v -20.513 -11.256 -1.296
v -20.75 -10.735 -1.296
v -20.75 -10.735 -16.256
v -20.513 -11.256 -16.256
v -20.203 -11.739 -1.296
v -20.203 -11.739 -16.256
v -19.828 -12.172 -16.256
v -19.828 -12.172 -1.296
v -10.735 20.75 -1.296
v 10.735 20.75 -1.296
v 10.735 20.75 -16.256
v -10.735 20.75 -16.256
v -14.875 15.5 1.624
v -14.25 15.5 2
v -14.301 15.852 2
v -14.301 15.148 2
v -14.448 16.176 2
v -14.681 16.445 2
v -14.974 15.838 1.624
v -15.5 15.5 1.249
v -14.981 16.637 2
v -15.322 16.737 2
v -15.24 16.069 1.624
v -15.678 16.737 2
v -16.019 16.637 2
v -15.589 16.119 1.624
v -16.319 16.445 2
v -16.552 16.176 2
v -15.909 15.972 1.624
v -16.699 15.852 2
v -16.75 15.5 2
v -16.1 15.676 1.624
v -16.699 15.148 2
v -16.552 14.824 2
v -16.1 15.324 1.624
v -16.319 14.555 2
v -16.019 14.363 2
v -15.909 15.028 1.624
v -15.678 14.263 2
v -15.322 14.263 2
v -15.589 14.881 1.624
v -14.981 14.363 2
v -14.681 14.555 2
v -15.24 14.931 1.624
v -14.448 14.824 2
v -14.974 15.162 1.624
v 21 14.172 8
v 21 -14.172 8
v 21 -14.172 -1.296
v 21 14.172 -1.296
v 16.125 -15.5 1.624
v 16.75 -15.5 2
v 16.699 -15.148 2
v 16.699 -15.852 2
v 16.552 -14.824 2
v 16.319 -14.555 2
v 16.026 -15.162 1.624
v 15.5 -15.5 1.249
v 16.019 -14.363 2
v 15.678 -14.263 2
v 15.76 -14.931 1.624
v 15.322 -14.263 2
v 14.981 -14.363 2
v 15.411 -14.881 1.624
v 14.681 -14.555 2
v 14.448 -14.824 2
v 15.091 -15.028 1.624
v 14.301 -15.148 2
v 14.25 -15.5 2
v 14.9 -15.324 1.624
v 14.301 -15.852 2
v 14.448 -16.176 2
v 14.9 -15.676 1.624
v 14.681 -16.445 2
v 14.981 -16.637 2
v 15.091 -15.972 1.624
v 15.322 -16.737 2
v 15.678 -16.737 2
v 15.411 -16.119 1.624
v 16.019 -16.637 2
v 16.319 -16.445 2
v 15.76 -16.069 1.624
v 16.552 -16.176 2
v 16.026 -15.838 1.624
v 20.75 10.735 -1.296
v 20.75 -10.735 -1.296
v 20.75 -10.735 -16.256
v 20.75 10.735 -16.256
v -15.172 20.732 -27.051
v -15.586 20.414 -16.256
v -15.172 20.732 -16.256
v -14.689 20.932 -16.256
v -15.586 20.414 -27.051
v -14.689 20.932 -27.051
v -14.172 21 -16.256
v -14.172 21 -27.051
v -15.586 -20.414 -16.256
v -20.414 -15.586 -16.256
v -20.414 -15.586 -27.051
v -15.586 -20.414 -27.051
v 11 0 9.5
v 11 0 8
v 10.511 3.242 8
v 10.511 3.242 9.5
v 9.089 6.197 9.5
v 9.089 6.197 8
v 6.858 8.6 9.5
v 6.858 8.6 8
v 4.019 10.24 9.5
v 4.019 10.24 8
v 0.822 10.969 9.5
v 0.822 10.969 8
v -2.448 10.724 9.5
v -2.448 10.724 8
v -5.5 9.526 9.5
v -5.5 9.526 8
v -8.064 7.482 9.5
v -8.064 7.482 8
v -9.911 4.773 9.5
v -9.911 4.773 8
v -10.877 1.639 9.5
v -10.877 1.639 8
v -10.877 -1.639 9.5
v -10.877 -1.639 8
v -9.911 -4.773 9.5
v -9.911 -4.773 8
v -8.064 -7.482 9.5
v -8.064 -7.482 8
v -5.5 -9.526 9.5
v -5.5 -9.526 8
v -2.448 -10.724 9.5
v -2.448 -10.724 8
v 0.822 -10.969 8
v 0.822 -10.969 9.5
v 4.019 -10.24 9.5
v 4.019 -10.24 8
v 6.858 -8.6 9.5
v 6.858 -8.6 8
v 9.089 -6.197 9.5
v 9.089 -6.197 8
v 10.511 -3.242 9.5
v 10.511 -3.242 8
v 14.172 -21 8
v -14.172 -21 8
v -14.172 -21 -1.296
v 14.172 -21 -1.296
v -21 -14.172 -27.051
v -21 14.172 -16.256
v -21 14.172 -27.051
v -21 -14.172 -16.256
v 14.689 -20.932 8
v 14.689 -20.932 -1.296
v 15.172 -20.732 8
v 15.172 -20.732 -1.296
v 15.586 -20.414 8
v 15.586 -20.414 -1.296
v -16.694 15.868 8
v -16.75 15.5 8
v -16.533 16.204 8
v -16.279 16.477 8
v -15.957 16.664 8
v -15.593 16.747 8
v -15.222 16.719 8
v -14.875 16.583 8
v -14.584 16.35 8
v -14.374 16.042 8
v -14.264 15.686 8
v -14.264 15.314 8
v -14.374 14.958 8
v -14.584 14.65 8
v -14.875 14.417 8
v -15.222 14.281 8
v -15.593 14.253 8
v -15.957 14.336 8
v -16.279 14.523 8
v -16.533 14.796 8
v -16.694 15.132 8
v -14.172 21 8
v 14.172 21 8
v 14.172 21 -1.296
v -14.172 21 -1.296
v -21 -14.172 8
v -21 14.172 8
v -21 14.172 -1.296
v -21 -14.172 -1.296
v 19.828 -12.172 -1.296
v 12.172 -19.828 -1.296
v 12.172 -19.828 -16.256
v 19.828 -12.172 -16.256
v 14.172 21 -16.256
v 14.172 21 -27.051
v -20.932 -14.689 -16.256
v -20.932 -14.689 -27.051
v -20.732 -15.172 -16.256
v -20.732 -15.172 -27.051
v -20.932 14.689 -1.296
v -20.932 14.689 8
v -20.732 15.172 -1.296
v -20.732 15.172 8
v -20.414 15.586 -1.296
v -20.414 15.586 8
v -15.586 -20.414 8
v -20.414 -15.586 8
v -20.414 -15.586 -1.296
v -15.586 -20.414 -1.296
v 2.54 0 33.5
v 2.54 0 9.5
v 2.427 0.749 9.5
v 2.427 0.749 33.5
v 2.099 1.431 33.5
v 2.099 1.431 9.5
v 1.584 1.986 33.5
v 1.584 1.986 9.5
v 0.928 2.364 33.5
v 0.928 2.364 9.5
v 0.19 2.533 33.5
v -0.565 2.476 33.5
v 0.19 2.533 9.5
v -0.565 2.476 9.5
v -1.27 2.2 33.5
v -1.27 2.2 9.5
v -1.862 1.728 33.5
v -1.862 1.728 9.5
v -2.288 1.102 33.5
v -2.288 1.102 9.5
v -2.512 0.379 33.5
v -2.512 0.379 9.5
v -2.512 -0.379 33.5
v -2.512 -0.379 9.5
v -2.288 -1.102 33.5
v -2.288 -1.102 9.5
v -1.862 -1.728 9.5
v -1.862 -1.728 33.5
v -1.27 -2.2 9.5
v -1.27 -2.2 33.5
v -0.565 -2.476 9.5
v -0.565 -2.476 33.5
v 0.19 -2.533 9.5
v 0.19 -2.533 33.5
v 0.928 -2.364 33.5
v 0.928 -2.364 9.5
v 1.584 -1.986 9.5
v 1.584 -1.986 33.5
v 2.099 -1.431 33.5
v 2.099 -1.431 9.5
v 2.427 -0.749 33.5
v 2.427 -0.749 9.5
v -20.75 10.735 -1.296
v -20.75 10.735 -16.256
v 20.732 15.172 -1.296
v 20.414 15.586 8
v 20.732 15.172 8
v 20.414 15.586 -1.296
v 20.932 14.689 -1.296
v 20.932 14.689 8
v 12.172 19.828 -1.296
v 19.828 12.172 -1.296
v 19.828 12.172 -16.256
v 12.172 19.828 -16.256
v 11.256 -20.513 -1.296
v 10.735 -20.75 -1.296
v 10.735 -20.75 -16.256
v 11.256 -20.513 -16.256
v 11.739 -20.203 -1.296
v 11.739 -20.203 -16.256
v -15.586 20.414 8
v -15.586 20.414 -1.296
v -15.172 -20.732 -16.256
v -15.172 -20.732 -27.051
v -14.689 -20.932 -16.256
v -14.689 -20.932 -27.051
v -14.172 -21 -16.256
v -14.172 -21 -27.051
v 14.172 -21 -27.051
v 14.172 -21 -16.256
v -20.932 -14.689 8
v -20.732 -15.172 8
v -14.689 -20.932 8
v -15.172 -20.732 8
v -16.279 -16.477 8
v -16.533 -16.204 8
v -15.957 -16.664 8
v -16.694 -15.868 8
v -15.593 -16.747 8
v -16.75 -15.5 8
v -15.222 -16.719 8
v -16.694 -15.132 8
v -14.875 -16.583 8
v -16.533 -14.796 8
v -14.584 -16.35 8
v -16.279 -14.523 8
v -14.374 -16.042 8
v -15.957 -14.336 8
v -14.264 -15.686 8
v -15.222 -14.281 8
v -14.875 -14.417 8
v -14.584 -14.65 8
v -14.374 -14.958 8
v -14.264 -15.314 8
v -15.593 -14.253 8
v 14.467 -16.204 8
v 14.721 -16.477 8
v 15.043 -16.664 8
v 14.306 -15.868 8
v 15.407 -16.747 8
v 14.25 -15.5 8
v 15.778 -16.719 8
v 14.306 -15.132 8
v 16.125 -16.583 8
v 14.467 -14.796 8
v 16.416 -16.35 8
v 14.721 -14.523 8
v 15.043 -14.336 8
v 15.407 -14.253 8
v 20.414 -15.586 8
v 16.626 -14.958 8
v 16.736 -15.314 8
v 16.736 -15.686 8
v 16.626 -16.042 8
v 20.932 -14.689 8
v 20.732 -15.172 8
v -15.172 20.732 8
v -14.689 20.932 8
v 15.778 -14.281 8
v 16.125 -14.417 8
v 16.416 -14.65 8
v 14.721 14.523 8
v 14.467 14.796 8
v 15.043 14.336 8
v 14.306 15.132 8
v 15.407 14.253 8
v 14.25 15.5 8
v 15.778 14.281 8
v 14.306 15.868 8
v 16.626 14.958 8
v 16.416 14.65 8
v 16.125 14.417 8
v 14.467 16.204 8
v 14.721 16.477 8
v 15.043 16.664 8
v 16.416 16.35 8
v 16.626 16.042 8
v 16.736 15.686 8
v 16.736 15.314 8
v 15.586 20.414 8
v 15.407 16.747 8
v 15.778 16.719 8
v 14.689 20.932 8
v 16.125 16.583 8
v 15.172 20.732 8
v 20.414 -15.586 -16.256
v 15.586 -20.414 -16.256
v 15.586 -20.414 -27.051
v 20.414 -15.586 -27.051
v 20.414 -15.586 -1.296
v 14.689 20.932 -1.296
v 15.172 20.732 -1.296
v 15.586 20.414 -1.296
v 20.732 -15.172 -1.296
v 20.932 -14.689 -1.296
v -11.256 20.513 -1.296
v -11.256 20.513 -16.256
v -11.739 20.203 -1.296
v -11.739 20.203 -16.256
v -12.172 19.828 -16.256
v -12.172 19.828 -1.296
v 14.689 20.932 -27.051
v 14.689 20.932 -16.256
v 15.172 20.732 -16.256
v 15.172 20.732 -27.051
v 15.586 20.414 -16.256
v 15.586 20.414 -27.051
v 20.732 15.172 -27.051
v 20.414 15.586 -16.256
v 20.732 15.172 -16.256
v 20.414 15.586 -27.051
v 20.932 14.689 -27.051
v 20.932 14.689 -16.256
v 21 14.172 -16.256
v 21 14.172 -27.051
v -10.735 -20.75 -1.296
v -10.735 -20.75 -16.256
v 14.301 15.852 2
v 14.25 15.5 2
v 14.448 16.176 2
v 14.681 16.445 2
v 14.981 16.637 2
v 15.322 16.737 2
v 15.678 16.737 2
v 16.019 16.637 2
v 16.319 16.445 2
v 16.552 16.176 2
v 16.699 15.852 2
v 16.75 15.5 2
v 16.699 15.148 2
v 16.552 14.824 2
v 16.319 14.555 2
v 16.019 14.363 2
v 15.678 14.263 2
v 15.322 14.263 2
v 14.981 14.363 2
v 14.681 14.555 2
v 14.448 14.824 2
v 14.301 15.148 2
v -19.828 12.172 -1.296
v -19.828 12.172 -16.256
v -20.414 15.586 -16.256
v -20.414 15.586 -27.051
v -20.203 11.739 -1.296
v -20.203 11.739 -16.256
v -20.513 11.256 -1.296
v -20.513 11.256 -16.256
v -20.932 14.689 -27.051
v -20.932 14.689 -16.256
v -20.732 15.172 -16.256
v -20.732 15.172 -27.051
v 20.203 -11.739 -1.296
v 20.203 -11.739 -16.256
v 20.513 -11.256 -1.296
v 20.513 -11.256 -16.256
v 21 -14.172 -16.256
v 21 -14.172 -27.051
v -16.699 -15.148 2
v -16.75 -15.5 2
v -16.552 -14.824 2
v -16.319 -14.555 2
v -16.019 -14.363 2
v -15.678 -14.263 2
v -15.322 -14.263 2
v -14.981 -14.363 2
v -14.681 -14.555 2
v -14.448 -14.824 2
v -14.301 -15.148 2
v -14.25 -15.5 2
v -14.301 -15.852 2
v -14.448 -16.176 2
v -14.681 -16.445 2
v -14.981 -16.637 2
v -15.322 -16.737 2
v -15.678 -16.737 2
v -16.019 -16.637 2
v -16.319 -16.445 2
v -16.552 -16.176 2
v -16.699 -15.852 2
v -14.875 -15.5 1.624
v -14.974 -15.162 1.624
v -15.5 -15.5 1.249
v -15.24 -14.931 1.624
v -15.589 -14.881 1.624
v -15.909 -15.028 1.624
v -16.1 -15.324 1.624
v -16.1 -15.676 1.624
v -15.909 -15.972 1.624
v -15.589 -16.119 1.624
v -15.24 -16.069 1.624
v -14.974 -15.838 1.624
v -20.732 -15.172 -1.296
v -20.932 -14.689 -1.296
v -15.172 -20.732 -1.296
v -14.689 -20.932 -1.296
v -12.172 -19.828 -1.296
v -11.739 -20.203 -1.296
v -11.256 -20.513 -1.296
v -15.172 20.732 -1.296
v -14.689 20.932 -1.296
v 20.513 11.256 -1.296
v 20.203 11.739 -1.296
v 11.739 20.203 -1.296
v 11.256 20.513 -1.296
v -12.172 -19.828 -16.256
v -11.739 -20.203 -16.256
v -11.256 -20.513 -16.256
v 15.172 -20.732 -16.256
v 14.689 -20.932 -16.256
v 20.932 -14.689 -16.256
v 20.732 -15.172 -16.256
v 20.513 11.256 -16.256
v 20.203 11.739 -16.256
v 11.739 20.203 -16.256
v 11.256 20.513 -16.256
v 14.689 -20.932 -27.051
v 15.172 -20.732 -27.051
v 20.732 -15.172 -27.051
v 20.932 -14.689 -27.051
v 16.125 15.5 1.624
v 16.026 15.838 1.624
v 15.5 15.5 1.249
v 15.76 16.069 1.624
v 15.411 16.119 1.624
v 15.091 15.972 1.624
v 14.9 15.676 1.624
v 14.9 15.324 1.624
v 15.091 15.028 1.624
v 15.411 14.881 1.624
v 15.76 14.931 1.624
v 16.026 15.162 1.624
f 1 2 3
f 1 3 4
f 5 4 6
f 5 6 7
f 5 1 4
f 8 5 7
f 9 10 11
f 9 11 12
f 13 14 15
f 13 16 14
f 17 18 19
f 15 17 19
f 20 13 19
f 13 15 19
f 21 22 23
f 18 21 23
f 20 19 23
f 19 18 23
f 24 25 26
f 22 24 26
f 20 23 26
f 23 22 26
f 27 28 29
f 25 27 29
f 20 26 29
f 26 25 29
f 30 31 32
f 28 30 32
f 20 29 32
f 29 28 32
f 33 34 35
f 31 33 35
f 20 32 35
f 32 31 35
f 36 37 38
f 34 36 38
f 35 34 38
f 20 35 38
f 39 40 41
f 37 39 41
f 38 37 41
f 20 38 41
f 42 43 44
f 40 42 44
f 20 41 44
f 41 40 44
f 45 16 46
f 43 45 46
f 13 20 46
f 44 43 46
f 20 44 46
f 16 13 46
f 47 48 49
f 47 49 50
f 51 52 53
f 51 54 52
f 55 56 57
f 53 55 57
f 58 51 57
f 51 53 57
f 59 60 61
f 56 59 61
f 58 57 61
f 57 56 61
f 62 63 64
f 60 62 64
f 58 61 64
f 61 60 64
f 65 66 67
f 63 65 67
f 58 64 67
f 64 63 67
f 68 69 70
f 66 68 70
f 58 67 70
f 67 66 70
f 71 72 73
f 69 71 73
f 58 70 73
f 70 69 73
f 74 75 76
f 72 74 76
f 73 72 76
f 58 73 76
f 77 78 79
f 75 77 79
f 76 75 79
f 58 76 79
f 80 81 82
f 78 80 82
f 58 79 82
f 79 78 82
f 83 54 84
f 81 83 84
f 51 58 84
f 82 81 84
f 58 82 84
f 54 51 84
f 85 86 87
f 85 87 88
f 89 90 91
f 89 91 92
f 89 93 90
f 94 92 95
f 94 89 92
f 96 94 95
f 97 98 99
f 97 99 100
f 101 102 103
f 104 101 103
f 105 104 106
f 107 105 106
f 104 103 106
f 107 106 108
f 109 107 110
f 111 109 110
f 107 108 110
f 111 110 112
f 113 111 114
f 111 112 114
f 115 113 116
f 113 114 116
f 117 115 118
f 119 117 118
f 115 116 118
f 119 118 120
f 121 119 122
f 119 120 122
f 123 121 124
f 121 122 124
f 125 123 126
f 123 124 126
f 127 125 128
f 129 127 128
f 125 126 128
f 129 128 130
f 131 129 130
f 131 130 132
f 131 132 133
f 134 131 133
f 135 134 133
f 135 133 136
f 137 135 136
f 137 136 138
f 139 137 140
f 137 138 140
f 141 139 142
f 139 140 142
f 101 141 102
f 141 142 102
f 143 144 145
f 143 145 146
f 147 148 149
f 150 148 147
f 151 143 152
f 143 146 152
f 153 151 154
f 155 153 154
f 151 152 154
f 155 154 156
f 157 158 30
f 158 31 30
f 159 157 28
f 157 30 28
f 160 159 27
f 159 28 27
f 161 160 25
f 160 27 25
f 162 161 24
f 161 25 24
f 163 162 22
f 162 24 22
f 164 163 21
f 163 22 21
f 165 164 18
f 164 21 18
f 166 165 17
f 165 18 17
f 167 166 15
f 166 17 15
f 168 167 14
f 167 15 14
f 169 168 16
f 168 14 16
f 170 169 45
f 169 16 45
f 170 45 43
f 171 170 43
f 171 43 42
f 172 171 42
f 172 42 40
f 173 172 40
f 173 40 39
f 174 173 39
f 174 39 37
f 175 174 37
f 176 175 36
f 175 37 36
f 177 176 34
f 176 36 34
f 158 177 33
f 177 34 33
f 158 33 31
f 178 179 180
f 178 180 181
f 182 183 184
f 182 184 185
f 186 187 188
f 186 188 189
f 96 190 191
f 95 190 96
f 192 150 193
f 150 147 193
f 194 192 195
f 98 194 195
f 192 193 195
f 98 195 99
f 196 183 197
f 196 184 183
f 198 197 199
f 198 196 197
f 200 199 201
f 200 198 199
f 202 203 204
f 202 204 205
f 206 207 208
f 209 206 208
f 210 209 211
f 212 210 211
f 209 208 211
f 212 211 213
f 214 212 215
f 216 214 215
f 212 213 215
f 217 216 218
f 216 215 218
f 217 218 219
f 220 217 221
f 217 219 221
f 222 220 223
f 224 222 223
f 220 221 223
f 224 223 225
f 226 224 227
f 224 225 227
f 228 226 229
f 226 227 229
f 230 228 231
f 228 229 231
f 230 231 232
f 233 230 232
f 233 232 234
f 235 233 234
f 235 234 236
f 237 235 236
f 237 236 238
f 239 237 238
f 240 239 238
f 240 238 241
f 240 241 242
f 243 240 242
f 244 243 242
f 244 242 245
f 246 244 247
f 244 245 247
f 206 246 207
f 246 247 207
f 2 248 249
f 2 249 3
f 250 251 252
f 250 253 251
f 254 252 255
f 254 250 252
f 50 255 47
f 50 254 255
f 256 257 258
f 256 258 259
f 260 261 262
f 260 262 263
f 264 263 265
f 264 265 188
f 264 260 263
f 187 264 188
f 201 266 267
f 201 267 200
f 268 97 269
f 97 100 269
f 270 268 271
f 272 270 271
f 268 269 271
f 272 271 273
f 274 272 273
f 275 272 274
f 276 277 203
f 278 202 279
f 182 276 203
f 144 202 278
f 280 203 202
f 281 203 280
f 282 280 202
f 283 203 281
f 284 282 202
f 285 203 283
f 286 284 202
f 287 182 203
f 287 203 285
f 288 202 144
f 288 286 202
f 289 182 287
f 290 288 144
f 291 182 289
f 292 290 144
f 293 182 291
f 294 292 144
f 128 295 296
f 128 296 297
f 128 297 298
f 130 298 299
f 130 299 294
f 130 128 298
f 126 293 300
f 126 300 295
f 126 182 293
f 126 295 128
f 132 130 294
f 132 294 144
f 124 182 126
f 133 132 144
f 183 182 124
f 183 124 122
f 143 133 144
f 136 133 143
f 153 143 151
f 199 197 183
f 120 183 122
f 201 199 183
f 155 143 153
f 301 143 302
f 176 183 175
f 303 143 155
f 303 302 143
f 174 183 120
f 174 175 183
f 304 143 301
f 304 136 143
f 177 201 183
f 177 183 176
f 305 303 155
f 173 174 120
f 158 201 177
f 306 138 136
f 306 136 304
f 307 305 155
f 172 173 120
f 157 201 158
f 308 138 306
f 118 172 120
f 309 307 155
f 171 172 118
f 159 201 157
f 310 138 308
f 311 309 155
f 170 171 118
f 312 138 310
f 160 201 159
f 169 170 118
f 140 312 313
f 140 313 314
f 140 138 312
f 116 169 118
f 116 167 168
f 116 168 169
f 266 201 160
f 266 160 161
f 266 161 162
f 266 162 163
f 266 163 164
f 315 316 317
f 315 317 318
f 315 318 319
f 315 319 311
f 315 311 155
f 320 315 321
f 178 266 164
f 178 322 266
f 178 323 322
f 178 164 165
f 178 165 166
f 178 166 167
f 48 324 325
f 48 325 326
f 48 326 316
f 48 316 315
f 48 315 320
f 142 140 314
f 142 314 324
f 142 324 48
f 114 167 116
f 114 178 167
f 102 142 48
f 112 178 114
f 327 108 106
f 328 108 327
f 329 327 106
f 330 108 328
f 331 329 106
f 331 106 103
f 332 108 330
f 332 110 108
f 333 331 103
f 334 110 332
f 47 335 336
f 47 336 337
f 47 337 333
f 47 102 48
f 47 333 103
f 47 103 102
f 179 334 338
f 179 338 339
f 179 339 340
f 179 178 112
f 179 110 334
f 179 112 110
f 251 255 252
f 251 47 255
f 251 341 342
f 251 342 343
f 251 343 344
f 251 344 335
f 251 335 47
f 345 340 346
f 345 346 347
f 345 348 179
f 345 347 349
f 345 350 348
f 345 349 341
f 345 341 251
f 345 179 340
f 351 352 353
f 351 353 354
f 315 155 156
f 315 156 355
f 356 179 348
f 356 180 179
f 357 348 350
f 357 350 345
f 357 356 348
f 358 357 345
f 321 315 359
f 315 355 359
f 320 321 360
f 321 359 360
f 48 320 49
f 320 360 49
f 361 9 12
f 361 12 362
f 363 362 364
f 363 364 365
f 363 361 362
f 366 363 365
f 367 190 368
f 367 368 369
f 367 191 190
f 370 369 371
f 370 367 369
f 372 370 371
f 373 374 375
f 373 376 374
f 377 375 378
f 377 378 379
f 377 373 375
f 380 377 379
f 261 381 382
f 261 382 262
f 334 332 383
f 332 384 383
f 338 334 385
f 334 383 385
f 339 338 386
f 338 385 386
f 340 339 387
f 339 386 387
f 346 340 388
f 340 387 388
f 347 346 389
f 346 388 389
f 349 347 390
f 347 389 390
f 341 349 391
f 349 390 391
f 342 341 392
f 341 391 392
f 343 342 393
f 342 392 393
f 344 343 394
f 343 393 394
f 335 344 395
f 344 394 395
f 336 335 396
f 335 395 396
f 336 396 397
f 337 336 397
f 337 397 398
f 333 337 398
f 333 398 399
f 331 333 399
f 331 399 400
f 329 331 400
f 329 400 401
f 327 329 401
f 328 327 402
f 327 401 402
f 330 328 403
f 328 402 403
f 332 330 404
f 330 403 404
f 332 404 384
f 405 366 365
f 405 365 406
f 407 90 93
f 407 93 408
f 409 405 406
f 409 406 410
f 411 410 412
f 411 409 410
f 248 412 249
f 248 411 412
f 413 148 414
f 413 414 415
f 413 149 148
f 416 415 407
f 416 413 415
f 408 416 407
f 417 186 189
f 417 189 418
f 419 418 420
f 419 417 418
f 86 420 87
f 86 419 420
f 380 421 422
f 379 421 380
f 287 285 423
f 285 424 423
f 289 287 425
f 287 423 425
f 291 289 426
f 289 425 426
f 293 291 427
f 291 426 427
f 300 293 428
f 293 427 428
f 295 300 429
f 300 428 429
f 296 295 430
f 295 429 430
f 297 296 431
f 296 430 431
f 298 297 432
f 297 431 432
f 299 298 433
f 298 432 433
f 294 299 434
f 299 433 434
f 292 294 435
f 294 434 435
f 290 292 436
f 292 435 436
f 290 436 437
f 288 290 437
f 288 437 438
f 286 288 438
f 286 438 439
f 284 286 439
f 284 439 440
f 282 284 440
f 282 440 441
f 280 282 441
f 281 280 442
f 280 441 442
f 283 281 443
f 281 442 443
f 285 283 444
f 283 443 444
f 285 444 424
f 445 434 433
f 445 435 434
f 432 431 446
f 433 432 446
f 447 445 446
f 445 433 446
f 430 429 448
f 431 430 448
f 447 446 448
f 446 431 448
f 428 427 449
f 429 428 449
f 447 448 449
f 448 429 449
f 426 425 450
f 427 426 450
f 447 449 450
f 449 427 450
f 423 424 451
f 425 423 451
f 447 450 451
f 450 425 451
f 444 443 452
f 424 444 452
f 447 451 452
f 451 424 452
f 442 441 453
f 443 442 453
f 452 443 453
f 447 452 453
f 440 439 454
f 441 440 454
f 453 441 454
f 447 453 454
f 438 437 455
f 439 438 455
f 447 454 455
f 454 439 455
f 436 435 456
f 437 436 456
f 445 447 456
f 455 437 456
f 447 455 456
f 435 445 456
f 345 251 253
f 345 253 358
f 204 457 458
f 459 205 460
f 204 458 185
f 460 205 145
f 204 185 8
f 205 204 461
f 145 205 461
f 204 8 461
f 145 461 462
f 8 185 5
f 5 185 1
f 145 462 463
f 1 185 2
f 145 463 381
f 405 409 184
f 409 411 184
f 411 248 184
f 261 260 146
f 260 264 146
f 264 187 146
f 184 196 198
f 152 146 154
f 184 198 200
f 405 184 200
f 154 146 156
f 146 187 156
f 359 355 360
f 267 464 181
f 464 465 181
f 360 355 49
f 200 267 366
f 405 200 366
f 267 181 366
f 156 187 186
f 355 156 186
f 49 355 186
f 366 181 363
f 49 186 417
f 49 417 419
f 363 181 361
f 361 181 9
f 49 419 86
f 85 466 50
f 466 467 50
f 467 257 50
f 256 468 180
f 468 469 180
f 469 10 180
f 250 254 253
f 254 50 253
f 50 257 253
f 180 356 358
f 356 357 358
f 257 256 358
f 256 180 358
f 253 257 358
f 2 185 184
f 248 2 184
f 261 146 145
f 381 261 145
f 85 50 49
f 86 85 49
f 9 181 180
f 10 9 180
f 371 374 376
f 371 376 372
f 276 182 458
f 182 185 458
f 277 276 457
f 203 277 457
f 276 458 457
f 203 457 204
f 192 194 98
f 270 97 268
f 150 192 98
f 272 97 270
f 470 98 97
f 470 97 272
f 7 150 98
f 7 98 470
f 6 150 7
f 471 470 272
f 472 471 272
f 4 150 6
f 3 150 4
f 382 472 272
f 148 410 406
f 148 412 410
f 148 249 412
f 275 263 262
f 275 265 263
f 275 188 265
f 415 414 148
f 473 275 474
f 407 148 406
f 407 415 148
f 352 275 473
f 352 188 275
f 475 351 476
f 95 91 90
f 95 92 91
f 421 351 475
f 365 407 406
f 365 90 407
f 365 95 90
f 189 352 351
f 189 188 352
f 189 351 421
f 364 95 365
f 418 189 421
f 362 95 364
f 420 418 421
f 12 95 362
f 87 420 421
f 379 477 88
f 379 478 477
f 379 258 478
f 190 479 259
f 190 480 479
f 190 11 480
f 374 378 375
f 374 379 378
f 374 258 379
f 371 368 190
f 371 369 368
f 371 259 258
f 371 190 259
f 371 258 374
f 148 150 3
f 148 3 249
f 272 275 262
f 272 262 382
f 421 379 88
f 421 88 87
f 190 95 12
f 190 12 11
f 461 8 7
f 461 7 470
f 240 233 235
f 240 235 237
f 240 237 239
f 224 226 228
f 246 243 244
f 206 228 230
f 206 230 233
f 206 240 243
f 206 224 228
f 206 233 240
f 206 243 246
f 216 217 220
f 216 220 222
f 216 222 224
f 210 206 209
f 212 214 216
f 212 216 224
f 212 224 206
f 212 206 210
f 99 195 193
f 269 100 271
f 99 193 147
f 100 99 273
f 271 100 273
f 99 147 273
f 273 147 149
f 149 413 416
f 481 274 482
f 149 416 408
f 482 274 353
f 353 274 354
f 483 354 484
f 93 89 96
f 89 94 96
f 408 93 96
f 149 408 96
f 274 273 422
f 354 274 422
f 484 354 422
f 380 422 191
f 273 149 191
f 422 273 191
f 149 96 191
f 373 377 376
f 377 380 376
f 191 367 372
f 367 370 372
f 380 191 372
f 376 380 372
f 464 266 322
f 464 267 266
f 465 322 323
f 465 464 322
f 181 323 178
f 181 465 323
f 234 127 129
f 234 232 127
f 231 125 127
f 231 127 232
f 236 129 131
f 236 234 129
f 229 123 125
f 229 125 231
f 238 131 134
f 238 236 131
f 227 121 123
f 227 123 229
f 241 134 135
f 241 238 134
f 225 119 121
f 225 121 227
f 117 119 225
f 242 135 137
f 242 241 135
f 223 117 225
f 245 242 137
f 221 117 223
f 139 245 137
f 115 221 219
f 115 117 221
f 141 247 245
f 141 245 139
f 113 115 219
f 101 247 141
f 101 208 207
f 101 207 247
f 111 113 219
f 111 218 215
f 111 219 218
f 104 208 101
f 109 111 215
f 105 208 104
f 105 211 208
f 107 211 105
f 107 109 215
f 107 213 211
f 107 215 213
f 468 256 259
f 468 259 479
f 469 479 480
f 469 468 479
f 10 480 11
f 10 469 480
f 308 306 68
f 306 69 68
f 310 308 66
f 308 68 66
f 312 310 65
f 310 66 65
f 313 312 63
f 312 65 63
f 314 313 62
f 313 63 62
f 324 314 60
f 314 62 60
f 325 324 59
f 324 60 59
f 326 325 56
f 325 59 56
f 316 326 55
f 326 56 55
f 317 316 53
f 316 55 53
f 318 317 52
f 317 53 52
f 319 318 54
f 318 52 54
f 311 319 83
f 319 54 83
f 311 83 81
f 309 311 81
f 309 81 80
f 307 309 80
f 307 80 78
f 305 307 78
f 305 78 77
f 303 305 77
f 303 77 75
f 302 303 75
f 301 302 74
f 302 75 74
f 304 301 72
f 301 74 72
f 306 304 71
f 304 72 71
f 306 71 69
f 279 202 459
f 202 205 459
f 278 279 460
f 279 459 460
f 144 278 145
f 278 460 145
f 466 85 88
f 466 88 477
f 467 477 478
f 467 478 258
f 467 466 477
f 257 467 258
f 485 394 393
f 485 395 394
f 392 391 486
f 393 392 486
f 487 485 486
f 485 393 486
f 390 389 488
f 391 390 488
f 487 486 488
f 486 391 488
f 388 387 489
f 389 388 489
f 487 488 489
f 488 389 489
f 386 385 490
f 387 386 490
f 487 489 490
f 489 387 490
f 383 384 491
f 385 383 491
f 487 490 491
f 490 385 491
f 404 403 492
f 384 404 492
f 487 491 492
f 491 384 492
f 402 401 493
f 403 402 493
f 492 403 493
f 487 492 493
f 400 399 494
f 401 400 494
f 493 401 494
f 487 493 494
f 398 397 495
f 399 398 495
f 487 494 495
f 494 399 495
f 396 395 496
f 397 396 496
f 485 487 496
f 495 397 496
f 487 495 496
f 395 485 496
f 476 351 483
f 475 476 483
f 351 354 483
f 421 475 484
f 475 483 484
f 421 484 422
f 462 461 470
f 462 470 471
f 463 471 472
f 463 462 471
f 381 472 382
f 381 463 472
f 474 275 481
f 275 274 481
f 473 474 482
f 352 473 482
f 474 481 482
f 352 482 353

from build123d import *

# Parameters (mm, degrees)
BOSS_EXTRUDE1_DEPTH       = 9.2964
BOSS_EXTRUDE2_DEPTH       = 16.002
BOSS_EXTRUDE3_DEPTH       = 10.795
SKETCH4_R                 = 11
BOSS_EXTRUDE4_DEPTH       = 1.5
SKETCH5_R                 = 2.54
BOSS_EXTRUDE5_DEPTH       = 24
F_2_CLEARANCE_HOLE1_D     = 2.5
F_2_CLEARANCE_HOLE1_DEPTH = 6
F_2_CLEARANCE_HOLE1_TIP   = 0.751075774
FILLET1_R                 = 2


with BuildPart() as part:
    # Sketch1 → Boss-Extrude1 (new body)
    with BuildSketch(Plane.XY.offset(8)):
        Polygon((-21, 15), (-21, -15), (-15, -21), (15, -21), (21, -15), (21, 15), (15, 21), (-15, 21), align=None)
    extrude(amount=-BOSS_EXTRUDE1_DEPTH)

    # Sketch2 → Boss-Extrude2 (add)
    with BuildSketch(Plane(origin=(0, 0, -1.2964), x_dir=(-1, 0, 0), z_dir=(0, 0, -1))):
        with BuildLine():
            Line((-10.735086841, 20.75), (10.735086841, 20.75))
            ThreePointArc((10.735086841, 20.75), (11.503053413, 20.366719307), (12.171572875, 19.828427125))
            Line((12.171572875, 19.828427125), (19.828427125, 12.171572875))
            ThreePointArc((19.828427125, 12.171572875), (20.366719307, 11.503053413), (20.75, 10.735086841))
            Line((20.75, 10.735086841), (20.75, -10.735086841))
            ThreePointArc((20.75, -10.735086841), (20.366719307, -11.503053413), (19.828427125, -12.171572875))
            Line((19.828427125, -12.171572875), (12.171572875, -19.828427125))
            ThreePointArc((12.171572875, -19.828427125), (11.503053413, -20.366719307), (10.735086841, -20.75))
            Line((10.735086841, -20.75), (-10.735086841, -20.75))
            ThreePointArc((-10.735086841, -20.75), (-11.503053413, -20.366719307), (-12.171572875, -19.828427125))
            Line((-12.171572875, -19.828427125), (-19.828427125, -12.171572875))
            ThreePointArc((-19.828427125, -12.171572875), (-20.366719307, -11.503053413), (-20.75, -10.735086841))
            Line((-20.75, -10.735086841), (-20.75, 10.735086841))
            ThreePointArc((-20.75, 10.735086841), (-20.366719307, 11.503053413), (-19.828427125, 12.171572875))
            Line((-19.828427125, 12.171572875), (-12.171572875, 19.828427125))
            ThreePointArc((-12.171572875, 19.828427125), (-11.503053413, 20.366719307), (-10.735086841, 20.75))
        make_face()
    extrude(amount=BOSS_EXTRUDE2_DEPTH)

    # Sketch3 → Boss-Extrude3 (add)
    with BuildSketch(Plane.XY.offset(-16.256)):
        Polygon((-21, 15), (-21, -15), (-15, -21), (15, -21), (21, -15), (21, 15), (15, 21), (-15, 21), align=None)
    extrude(amount=-BOSS_EXTRUDE3_DEPTH)

    # Sketch4 → Boss-Extrude4 (add)
    with BuildSketch(Plane.XY.offset(8)):
        Circle(SKETCH4_R)
    extrude(amount=BOSS_EXTRUDE4_DEPTH)

    # Sketch5 → Boss-Extrude5 (add)
    with BuildSketch(Plane.XY.offset(9.5)):
        Circle(SKETCH5_R)
    extrude(amount=BOSS_EXTRUDE5_DEPTH)

    # #2 Clearance Hole1
    with Locations(Plane.XY.offset(8)):
        with Locations((-15.5, 15.5), (15.5, 15.5), (-15.5, -15.5), (15.5, -15.5)):
            Hole(F_2_CLEARANCE_HOLE1_D / 2, depth=F_2_CLEARANCE_HOLE1_DEPTH)
            with Locations((0, 0, -(F_2_CLEARANCE_HOLE1_DEPTH + F_2_CLEARANCE_HOLE1_TIP / 2))):  # 118° drill point
                Cone(0, F_2_CLEARANCE_HOLE1_D / 2, F_2_CLEARANCE_HOLE1_TIP, mode=Mode.SUBTRACT)

    # Fillet1
    fillet1_edges = [part.edges().sort_by_distance(p)[0] for p in [
        (-15, 21, 3.3518),
        (15, 21, 3.3518),
        (21, 15, 3.3518),
        (21, -15, 3.3518),
        (15, -21, 3.3518),
        (-15, -21, 3.3518),
        (-21, -15, 3.3518),
        (-21, 15, 3.3518),
        (-21, 15, -21.6535),
        (-15, 21, -21.6535),
        (15, 21, -21.6535),
        (21, 15, -21.6535),
        (21, -15, -21.6535),
        (15, -21, -21.6535),
        (-15, -21, -21.6535),
        (-21, -15, -21.6535),
    ]]
    fillet(fillet1_edges, radius=FILLET1_R)


solid = part.part
